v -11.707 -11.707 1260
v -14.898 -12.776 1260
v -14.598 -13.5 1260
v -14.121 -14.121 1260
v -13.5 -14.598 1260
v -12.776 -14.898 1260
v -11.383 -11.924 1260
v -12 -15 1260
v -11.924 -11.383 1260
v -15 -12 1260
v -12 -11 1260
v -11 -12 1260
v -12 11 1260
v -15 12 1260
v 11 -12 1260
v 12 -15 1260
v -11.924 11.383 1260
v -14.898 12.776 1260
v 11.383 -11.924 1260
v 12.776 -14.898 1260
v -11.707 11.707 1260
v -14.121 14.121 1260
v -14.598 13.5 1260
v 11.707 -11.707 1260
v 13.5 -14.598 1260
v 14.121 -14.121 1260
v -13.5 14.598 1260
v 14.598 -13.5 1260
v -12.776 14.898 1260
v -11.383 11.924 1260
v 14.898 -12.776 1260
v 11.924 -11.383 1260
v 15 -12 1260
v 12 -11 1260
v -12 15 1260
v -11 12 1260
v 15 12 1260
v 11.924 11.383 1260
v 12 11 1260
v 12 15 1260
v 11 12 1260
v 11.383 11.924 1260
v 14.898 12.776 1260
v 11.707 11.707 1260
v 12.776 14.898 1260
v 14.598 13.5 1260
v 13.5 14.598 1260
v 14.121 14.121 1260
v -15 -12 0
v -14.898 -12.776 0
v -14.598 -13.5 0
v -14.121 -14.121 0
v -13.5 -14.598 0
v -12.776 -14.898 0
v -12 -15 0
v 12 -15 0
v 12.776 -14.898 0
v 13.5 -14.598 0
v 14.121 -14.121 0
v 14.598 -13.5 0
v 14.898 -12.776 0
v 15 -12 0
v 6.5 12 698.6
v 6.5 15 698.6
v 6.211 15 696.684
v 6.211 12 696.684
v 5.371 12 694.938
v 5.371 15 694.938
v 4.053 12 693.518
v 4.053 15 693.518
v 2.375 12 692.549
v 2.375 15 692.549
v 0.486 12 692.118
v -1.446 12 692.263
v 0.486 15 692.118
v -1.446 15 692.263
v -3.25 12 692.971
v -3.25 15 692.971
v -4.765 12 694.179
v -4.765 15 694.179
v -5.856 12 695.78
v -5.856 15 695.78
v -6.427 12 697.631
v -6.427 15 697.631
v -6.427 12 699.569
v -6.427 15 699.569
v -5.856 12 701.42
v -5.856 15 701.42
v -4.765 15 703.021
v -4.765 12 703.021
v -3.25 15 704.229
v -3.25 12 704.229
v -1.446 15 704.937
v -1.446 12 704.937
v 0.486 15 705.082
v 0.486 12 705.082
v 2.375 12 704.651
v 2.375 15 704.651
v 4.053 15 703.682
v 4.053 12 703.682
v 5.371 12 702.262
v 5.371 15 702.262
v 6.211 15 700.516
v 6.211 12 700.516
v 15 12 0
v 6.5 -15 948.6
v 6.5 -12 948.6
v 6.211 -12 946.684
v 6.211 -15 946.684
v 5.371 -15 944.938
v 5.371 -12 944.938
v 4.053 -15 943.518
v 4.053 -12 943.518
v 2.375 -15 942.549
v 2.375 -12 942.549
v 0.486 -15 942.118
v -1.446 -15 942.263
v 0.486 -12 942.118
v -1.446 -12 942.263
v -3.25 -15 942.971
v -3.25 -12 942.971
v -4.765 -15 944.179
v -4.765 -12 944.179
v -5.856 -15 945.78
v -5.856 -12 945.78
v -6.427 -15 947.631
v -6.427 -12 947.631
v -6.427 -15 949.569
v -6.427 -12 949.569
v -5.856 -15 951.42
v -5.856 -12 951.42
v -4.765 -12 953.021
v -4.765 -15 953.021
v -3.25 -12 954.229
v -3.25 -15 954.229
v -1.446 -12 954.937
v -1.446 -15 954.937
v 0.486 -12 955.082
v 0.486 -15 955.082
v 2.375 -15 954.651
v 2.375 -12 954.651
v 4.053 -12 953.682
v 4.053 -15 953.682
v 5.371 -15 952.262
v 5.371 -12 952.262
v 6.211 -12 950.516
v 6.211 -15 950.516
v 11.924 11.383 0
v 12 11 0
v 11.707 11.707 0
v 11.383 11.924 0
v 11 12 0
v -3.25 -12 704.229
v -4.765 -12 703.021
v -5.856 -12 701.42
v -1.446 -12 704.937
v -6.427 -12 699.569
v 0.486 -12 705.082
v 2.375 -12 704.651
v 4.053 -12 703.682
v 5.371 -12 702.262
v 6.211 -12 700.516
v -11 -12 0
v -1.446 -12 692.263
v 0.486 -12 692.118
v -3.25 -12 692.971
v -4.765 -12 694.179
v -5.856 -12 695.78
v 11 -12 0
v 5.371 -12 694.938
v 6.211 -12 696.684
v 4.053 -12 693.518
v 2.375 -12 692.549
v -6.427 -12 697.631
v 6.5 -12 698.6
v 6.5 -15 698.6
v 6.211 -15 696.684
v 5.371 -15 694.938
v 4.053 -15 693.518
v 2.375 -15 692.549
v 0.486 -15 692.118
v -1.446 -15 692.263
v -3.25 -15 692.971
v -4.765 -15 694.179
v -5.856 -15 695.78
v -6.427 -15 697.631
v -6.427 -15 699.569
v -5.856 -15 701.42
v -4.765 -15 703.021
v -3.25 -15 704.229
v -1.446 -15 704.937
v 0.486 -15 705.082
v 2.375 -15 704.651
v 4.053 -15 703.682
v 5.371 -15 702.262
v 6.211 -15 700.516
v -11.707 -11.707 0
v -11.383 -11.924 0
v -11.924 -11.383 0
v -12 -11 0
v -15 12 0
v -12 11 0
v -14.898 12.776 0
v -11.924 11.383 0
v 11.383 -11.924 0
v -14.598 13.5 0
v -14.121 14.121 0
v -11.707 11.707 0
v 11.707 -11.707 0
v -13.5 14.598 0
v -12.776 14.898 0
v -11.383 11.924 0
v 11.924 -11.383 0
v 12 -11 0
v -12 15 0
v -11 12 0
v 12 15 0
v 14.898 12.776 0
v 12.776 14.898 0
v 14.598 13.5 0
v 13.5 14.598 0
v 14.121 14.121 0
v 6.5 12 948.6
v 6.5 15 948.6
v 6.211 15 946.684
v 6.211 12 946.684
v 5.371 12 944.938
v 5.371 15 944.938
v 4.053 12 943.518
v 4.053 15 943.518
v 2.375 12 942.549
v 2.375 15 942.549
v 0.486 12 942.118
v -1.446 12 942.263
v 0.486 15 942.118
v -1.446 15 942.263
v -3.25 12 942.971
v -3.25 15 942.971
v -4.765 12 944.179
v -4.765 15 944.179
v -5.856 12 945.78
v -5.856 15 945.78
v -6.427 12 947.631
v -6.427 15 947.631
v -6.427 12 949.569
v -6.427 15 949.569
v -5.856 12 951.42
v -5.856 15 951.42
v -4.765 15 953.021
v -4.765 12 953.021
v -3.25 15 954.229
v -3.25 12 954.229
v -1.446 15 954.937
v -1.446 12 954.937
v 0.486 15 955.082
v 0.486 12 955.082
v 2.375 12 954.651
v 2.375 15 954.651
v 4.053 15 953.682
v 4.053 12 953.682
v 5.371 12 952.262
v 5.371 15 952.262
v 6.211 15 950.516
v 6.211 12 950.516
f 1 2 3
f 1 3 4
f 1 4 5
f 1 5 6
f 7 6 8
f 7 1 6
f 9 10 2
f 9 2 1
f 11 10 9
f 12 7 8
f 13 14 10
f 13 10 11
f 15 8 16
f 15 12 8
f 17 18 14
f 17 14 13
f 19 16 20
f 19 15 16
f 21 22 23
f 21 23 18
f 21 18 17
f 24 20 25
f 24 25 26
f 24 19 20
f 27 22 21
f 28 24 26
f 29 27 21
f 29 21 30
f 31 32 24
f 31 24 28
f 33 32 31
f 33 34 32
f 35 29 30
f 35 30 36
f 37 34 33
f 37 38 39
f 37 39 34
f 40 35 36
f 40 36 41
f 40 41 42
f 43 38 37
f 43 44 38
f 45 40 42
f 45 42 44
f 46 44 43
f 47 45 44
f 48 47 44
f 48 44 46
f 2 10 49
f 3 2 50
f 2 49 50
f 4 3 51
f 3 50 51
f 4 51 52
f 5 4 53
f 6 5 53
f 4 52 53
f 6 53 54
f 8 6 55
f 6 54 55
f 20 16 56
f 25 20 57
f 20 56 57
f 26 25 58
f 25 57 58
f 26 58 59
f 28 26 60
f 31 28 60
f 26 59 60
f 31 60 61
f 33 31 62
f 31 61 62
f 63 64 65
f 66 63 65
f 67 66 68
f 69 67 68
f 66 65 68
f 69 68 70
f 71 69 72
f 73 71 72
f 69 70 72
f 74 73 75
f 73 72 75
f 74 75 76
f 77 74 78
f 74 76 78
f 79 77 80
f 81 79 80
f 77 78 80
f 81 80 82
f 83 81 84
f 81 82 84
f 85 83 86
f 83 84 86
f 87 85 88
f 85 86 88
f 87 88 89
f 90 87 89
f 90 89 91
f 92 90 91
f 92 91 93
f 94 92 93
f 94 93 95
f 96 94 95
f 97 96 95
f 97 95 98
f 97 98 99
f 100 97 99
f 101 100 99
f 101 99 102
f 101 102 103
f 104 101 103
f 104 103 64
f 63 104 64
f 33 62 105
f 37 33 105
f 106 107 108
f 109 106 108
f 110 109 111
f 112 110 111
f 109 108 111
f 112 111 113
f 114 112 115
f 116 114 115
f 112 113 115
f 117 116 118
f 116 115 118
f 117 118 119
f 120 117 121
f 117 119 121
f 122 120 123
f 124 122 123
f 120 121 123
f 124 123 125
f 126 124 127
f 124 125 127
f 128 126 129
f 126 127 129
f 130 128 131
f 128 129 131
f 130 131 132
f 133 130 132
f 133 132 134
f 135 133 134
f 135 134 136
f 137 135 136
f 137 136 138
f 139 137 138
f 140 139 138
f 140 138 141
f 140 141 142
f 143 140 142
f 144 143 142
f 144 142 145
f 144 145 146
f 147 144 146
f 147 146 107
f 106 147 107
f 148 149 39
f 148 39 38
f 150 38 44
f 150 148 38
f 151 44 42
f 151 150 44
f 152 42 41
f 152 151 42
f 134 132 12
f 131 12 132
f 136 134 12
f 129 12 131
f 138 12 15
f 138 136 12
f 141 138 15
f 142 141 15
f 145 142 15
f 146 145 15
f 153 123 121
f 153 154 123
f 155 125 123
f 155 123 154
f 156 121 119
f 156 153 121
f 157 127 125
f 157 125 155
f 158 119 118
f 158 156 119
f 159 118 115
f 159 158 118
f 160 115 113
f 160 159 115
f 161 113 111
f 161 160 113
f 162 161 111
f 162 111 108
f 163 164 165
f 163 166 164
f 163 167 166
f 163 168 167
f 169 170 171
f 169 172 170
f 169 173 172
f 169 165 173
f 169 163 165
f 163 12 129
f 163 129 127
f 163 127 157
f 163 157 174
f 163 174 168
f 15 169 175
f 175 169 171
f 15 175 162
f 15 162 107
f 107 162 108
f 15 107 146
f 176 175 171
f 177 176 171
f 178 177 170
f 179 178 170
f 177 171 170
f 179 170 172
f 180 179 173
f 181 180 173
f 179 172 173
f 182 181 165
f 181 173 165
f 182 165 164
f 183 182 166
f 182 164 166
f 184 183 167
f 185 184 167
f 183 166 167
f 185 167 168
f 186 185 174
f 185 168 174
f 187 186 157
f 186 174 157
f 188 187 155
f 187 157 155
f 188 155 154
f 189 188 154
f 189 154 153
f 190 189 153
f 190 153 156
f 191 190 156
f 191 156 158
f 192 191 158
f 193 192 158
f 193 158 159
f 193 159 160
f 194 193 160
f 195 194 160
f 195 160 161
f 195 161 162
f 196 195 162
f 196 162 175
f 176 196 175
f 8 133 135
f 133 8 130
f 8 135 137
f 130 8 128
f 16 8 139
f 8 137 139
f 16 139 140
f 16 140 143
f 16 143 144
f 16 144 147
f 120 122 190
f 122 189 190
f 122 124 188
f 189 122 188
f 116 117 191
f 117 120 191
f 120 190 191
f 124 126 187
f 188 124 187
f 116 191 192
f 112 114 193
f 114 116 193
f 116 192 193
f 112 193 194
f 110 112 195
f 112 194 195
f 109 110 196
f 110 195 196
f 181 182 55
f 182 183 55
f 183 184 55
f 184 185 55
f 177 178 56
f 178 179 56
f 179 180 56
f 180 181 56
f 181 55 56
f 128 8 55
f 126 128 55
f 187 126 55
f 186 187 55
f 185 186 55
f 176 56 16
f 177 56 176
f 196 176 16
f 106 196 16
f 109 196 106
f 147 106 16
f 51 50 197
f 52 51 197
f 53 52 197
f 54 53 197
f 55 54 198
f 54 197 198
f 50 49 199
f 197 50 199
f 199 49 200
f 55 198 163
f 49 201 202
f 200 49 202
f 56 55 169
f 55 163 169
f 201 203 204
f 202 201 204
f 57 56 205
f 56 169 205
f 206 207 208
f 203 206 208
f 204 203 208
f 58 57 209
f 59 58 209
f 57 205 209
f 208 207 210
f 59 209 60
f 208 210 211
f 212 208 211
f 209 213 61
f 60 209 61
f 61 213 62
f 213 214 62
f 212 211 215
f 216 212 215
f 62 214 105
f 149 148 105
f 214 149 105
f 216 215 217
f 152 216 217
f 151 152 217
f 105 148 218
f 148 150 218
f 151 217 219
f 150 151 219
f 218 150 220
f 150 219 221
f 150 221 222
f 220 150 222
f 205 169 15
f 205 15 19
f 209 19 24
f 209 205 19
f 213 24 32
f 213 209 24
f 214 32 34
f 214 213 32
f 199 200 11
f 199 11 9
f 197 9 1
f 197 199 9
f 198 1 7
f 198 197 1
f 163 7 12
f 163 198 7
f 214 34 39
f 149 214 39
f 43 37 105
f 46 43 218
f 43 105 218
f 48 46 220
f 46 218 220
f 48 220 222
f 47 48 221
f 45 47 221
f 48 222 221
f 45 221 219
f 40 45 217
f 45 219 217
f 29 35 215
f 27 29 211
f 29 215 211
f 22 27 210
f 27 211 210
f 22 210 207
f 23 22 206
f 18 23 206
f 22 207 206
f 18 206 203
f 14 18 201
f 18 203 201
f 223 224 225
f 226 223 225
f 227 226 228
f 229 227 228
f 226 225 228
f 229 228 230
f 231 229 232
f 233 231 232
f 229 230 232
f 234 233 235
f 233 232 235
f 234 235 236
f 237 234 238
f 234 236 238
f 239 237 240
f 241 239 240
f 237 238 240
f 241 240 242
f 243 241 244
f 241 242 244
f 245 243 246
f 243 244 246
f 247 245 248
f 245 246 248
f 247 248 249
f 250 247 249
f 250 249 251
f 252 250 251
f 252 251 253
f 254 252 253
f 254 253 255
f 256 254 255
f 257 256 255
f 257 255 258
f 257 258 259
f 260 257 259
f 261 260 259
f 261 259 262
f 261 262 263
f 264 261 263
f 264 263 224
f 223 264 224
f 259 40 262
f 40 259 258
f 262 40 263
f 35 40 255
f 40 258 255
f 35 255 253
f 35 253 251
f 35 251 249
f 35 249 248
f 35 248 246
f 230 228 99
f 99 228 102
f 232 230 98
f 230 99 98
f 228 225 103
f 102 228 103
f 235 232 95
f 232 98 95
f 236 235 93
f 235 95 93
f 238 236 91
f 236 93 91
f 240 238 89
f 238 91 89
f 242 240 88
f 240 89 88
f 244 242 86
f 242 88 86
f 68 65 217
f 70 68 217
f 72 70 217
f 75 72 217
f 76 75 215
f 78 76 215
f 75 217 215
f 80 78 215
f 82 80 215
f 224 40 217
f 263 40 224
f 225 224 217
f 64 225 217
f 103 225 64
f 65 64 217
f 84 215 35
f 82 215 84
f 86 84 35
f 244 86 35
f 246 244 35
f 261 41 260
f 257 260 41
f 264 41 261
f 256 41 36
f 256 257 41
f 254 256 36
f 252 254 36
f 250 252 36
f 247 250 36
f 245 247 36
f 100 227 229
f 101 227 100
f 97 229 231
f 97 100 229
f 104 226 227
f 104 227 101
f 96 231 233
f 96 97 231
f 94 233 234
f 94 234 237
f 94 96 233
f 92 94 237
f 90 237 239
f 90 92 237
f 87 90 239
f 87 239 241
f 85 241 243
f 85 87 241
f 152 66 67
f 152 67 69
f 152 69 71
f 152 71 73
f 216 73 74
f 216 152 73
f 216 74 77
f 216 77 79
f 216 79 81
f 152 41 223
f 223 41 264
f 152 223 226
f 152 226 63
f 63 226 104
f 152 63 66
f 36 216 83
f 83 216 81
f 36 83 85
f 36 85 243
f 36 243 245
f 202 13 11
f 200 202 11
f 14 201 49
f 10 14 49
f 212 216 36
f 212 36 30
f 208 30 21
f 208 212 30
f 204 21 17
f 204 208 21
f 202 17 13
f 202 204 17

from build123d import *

# Parameters (mm, degrees)
DODANIE_WYCI_GNI_CIE1_DEPTH = 1260
SZKIC6_R                    = 6.5
WYTNIJ_WYCI_GNI_CIE5_DEPTH  = 30


with BuildPart() as part:
    # Szkic1 → Dodanie-wyciągnięcie1 (new body)
    with BuildSketch(Plane.XY):
        with BuildLine():
            Line((-12, -15), (12, -15))
            ThreePointArc((12, -15), (14.121320344, -14.121320344), (15, -12))
            Line((15, -12), (15, 12))
            ThreePointArc((15, 12), (14.121320344, 14.121320344), (12, 15))
            Line((12, 15), (-12, 15))
            ThreePointArc((-12, 15), (-14.121320344, 14.121320344), (-15, 12))
            Line((-15, 12), (-15, -12))
            ThreePointArc((-15, -12), (-14.121320344, -14.121320344), (-12, -15))
        make_face()
        with BuildLine():
            Line((-11, -12), (11, -12))
            ThreePointArc((11, -12), (11.707106781, -11.707106781), (12, -11))
            Line((12, -11), (12, 11))
            ThreePointArc((12, 11), (11.707106781, 11.707106781), (11, 12))
            Line((11, 12), (-11, 12))
            ThreePointArc((-11, 12), (-11.707106781, 11.707106781), (-12, 11))
            Line((-12, 11), (-12, -11))
            ThreePointArc((-12, -11), (-11.707106781, -11.707106781), (-11, -12))
        make_face(mode=Mode.SUBTRACT)
    extrude(amount=DODANIE_WYCI_GNI_CIE1_DEPTH)

    # Szkic6 → Wytnij-wyciągnięcie5 (cut)
    with BuildSketch(Plane(origin=(0, 15, 0), x_dir=(1, 0, 0), z_dir=(0, 1, 0))):
        with Locations((0, -948.6)):
            Circle(SZKIC6_R)
        with Locations((0, -698.6)):
            Circle(SZKIC6_R)
    extrude(amount=-WYTNIJ_WYCI_GNI_CIE5_DEPTH, mode=Mode.SUBTRACT)


solid = part.part
